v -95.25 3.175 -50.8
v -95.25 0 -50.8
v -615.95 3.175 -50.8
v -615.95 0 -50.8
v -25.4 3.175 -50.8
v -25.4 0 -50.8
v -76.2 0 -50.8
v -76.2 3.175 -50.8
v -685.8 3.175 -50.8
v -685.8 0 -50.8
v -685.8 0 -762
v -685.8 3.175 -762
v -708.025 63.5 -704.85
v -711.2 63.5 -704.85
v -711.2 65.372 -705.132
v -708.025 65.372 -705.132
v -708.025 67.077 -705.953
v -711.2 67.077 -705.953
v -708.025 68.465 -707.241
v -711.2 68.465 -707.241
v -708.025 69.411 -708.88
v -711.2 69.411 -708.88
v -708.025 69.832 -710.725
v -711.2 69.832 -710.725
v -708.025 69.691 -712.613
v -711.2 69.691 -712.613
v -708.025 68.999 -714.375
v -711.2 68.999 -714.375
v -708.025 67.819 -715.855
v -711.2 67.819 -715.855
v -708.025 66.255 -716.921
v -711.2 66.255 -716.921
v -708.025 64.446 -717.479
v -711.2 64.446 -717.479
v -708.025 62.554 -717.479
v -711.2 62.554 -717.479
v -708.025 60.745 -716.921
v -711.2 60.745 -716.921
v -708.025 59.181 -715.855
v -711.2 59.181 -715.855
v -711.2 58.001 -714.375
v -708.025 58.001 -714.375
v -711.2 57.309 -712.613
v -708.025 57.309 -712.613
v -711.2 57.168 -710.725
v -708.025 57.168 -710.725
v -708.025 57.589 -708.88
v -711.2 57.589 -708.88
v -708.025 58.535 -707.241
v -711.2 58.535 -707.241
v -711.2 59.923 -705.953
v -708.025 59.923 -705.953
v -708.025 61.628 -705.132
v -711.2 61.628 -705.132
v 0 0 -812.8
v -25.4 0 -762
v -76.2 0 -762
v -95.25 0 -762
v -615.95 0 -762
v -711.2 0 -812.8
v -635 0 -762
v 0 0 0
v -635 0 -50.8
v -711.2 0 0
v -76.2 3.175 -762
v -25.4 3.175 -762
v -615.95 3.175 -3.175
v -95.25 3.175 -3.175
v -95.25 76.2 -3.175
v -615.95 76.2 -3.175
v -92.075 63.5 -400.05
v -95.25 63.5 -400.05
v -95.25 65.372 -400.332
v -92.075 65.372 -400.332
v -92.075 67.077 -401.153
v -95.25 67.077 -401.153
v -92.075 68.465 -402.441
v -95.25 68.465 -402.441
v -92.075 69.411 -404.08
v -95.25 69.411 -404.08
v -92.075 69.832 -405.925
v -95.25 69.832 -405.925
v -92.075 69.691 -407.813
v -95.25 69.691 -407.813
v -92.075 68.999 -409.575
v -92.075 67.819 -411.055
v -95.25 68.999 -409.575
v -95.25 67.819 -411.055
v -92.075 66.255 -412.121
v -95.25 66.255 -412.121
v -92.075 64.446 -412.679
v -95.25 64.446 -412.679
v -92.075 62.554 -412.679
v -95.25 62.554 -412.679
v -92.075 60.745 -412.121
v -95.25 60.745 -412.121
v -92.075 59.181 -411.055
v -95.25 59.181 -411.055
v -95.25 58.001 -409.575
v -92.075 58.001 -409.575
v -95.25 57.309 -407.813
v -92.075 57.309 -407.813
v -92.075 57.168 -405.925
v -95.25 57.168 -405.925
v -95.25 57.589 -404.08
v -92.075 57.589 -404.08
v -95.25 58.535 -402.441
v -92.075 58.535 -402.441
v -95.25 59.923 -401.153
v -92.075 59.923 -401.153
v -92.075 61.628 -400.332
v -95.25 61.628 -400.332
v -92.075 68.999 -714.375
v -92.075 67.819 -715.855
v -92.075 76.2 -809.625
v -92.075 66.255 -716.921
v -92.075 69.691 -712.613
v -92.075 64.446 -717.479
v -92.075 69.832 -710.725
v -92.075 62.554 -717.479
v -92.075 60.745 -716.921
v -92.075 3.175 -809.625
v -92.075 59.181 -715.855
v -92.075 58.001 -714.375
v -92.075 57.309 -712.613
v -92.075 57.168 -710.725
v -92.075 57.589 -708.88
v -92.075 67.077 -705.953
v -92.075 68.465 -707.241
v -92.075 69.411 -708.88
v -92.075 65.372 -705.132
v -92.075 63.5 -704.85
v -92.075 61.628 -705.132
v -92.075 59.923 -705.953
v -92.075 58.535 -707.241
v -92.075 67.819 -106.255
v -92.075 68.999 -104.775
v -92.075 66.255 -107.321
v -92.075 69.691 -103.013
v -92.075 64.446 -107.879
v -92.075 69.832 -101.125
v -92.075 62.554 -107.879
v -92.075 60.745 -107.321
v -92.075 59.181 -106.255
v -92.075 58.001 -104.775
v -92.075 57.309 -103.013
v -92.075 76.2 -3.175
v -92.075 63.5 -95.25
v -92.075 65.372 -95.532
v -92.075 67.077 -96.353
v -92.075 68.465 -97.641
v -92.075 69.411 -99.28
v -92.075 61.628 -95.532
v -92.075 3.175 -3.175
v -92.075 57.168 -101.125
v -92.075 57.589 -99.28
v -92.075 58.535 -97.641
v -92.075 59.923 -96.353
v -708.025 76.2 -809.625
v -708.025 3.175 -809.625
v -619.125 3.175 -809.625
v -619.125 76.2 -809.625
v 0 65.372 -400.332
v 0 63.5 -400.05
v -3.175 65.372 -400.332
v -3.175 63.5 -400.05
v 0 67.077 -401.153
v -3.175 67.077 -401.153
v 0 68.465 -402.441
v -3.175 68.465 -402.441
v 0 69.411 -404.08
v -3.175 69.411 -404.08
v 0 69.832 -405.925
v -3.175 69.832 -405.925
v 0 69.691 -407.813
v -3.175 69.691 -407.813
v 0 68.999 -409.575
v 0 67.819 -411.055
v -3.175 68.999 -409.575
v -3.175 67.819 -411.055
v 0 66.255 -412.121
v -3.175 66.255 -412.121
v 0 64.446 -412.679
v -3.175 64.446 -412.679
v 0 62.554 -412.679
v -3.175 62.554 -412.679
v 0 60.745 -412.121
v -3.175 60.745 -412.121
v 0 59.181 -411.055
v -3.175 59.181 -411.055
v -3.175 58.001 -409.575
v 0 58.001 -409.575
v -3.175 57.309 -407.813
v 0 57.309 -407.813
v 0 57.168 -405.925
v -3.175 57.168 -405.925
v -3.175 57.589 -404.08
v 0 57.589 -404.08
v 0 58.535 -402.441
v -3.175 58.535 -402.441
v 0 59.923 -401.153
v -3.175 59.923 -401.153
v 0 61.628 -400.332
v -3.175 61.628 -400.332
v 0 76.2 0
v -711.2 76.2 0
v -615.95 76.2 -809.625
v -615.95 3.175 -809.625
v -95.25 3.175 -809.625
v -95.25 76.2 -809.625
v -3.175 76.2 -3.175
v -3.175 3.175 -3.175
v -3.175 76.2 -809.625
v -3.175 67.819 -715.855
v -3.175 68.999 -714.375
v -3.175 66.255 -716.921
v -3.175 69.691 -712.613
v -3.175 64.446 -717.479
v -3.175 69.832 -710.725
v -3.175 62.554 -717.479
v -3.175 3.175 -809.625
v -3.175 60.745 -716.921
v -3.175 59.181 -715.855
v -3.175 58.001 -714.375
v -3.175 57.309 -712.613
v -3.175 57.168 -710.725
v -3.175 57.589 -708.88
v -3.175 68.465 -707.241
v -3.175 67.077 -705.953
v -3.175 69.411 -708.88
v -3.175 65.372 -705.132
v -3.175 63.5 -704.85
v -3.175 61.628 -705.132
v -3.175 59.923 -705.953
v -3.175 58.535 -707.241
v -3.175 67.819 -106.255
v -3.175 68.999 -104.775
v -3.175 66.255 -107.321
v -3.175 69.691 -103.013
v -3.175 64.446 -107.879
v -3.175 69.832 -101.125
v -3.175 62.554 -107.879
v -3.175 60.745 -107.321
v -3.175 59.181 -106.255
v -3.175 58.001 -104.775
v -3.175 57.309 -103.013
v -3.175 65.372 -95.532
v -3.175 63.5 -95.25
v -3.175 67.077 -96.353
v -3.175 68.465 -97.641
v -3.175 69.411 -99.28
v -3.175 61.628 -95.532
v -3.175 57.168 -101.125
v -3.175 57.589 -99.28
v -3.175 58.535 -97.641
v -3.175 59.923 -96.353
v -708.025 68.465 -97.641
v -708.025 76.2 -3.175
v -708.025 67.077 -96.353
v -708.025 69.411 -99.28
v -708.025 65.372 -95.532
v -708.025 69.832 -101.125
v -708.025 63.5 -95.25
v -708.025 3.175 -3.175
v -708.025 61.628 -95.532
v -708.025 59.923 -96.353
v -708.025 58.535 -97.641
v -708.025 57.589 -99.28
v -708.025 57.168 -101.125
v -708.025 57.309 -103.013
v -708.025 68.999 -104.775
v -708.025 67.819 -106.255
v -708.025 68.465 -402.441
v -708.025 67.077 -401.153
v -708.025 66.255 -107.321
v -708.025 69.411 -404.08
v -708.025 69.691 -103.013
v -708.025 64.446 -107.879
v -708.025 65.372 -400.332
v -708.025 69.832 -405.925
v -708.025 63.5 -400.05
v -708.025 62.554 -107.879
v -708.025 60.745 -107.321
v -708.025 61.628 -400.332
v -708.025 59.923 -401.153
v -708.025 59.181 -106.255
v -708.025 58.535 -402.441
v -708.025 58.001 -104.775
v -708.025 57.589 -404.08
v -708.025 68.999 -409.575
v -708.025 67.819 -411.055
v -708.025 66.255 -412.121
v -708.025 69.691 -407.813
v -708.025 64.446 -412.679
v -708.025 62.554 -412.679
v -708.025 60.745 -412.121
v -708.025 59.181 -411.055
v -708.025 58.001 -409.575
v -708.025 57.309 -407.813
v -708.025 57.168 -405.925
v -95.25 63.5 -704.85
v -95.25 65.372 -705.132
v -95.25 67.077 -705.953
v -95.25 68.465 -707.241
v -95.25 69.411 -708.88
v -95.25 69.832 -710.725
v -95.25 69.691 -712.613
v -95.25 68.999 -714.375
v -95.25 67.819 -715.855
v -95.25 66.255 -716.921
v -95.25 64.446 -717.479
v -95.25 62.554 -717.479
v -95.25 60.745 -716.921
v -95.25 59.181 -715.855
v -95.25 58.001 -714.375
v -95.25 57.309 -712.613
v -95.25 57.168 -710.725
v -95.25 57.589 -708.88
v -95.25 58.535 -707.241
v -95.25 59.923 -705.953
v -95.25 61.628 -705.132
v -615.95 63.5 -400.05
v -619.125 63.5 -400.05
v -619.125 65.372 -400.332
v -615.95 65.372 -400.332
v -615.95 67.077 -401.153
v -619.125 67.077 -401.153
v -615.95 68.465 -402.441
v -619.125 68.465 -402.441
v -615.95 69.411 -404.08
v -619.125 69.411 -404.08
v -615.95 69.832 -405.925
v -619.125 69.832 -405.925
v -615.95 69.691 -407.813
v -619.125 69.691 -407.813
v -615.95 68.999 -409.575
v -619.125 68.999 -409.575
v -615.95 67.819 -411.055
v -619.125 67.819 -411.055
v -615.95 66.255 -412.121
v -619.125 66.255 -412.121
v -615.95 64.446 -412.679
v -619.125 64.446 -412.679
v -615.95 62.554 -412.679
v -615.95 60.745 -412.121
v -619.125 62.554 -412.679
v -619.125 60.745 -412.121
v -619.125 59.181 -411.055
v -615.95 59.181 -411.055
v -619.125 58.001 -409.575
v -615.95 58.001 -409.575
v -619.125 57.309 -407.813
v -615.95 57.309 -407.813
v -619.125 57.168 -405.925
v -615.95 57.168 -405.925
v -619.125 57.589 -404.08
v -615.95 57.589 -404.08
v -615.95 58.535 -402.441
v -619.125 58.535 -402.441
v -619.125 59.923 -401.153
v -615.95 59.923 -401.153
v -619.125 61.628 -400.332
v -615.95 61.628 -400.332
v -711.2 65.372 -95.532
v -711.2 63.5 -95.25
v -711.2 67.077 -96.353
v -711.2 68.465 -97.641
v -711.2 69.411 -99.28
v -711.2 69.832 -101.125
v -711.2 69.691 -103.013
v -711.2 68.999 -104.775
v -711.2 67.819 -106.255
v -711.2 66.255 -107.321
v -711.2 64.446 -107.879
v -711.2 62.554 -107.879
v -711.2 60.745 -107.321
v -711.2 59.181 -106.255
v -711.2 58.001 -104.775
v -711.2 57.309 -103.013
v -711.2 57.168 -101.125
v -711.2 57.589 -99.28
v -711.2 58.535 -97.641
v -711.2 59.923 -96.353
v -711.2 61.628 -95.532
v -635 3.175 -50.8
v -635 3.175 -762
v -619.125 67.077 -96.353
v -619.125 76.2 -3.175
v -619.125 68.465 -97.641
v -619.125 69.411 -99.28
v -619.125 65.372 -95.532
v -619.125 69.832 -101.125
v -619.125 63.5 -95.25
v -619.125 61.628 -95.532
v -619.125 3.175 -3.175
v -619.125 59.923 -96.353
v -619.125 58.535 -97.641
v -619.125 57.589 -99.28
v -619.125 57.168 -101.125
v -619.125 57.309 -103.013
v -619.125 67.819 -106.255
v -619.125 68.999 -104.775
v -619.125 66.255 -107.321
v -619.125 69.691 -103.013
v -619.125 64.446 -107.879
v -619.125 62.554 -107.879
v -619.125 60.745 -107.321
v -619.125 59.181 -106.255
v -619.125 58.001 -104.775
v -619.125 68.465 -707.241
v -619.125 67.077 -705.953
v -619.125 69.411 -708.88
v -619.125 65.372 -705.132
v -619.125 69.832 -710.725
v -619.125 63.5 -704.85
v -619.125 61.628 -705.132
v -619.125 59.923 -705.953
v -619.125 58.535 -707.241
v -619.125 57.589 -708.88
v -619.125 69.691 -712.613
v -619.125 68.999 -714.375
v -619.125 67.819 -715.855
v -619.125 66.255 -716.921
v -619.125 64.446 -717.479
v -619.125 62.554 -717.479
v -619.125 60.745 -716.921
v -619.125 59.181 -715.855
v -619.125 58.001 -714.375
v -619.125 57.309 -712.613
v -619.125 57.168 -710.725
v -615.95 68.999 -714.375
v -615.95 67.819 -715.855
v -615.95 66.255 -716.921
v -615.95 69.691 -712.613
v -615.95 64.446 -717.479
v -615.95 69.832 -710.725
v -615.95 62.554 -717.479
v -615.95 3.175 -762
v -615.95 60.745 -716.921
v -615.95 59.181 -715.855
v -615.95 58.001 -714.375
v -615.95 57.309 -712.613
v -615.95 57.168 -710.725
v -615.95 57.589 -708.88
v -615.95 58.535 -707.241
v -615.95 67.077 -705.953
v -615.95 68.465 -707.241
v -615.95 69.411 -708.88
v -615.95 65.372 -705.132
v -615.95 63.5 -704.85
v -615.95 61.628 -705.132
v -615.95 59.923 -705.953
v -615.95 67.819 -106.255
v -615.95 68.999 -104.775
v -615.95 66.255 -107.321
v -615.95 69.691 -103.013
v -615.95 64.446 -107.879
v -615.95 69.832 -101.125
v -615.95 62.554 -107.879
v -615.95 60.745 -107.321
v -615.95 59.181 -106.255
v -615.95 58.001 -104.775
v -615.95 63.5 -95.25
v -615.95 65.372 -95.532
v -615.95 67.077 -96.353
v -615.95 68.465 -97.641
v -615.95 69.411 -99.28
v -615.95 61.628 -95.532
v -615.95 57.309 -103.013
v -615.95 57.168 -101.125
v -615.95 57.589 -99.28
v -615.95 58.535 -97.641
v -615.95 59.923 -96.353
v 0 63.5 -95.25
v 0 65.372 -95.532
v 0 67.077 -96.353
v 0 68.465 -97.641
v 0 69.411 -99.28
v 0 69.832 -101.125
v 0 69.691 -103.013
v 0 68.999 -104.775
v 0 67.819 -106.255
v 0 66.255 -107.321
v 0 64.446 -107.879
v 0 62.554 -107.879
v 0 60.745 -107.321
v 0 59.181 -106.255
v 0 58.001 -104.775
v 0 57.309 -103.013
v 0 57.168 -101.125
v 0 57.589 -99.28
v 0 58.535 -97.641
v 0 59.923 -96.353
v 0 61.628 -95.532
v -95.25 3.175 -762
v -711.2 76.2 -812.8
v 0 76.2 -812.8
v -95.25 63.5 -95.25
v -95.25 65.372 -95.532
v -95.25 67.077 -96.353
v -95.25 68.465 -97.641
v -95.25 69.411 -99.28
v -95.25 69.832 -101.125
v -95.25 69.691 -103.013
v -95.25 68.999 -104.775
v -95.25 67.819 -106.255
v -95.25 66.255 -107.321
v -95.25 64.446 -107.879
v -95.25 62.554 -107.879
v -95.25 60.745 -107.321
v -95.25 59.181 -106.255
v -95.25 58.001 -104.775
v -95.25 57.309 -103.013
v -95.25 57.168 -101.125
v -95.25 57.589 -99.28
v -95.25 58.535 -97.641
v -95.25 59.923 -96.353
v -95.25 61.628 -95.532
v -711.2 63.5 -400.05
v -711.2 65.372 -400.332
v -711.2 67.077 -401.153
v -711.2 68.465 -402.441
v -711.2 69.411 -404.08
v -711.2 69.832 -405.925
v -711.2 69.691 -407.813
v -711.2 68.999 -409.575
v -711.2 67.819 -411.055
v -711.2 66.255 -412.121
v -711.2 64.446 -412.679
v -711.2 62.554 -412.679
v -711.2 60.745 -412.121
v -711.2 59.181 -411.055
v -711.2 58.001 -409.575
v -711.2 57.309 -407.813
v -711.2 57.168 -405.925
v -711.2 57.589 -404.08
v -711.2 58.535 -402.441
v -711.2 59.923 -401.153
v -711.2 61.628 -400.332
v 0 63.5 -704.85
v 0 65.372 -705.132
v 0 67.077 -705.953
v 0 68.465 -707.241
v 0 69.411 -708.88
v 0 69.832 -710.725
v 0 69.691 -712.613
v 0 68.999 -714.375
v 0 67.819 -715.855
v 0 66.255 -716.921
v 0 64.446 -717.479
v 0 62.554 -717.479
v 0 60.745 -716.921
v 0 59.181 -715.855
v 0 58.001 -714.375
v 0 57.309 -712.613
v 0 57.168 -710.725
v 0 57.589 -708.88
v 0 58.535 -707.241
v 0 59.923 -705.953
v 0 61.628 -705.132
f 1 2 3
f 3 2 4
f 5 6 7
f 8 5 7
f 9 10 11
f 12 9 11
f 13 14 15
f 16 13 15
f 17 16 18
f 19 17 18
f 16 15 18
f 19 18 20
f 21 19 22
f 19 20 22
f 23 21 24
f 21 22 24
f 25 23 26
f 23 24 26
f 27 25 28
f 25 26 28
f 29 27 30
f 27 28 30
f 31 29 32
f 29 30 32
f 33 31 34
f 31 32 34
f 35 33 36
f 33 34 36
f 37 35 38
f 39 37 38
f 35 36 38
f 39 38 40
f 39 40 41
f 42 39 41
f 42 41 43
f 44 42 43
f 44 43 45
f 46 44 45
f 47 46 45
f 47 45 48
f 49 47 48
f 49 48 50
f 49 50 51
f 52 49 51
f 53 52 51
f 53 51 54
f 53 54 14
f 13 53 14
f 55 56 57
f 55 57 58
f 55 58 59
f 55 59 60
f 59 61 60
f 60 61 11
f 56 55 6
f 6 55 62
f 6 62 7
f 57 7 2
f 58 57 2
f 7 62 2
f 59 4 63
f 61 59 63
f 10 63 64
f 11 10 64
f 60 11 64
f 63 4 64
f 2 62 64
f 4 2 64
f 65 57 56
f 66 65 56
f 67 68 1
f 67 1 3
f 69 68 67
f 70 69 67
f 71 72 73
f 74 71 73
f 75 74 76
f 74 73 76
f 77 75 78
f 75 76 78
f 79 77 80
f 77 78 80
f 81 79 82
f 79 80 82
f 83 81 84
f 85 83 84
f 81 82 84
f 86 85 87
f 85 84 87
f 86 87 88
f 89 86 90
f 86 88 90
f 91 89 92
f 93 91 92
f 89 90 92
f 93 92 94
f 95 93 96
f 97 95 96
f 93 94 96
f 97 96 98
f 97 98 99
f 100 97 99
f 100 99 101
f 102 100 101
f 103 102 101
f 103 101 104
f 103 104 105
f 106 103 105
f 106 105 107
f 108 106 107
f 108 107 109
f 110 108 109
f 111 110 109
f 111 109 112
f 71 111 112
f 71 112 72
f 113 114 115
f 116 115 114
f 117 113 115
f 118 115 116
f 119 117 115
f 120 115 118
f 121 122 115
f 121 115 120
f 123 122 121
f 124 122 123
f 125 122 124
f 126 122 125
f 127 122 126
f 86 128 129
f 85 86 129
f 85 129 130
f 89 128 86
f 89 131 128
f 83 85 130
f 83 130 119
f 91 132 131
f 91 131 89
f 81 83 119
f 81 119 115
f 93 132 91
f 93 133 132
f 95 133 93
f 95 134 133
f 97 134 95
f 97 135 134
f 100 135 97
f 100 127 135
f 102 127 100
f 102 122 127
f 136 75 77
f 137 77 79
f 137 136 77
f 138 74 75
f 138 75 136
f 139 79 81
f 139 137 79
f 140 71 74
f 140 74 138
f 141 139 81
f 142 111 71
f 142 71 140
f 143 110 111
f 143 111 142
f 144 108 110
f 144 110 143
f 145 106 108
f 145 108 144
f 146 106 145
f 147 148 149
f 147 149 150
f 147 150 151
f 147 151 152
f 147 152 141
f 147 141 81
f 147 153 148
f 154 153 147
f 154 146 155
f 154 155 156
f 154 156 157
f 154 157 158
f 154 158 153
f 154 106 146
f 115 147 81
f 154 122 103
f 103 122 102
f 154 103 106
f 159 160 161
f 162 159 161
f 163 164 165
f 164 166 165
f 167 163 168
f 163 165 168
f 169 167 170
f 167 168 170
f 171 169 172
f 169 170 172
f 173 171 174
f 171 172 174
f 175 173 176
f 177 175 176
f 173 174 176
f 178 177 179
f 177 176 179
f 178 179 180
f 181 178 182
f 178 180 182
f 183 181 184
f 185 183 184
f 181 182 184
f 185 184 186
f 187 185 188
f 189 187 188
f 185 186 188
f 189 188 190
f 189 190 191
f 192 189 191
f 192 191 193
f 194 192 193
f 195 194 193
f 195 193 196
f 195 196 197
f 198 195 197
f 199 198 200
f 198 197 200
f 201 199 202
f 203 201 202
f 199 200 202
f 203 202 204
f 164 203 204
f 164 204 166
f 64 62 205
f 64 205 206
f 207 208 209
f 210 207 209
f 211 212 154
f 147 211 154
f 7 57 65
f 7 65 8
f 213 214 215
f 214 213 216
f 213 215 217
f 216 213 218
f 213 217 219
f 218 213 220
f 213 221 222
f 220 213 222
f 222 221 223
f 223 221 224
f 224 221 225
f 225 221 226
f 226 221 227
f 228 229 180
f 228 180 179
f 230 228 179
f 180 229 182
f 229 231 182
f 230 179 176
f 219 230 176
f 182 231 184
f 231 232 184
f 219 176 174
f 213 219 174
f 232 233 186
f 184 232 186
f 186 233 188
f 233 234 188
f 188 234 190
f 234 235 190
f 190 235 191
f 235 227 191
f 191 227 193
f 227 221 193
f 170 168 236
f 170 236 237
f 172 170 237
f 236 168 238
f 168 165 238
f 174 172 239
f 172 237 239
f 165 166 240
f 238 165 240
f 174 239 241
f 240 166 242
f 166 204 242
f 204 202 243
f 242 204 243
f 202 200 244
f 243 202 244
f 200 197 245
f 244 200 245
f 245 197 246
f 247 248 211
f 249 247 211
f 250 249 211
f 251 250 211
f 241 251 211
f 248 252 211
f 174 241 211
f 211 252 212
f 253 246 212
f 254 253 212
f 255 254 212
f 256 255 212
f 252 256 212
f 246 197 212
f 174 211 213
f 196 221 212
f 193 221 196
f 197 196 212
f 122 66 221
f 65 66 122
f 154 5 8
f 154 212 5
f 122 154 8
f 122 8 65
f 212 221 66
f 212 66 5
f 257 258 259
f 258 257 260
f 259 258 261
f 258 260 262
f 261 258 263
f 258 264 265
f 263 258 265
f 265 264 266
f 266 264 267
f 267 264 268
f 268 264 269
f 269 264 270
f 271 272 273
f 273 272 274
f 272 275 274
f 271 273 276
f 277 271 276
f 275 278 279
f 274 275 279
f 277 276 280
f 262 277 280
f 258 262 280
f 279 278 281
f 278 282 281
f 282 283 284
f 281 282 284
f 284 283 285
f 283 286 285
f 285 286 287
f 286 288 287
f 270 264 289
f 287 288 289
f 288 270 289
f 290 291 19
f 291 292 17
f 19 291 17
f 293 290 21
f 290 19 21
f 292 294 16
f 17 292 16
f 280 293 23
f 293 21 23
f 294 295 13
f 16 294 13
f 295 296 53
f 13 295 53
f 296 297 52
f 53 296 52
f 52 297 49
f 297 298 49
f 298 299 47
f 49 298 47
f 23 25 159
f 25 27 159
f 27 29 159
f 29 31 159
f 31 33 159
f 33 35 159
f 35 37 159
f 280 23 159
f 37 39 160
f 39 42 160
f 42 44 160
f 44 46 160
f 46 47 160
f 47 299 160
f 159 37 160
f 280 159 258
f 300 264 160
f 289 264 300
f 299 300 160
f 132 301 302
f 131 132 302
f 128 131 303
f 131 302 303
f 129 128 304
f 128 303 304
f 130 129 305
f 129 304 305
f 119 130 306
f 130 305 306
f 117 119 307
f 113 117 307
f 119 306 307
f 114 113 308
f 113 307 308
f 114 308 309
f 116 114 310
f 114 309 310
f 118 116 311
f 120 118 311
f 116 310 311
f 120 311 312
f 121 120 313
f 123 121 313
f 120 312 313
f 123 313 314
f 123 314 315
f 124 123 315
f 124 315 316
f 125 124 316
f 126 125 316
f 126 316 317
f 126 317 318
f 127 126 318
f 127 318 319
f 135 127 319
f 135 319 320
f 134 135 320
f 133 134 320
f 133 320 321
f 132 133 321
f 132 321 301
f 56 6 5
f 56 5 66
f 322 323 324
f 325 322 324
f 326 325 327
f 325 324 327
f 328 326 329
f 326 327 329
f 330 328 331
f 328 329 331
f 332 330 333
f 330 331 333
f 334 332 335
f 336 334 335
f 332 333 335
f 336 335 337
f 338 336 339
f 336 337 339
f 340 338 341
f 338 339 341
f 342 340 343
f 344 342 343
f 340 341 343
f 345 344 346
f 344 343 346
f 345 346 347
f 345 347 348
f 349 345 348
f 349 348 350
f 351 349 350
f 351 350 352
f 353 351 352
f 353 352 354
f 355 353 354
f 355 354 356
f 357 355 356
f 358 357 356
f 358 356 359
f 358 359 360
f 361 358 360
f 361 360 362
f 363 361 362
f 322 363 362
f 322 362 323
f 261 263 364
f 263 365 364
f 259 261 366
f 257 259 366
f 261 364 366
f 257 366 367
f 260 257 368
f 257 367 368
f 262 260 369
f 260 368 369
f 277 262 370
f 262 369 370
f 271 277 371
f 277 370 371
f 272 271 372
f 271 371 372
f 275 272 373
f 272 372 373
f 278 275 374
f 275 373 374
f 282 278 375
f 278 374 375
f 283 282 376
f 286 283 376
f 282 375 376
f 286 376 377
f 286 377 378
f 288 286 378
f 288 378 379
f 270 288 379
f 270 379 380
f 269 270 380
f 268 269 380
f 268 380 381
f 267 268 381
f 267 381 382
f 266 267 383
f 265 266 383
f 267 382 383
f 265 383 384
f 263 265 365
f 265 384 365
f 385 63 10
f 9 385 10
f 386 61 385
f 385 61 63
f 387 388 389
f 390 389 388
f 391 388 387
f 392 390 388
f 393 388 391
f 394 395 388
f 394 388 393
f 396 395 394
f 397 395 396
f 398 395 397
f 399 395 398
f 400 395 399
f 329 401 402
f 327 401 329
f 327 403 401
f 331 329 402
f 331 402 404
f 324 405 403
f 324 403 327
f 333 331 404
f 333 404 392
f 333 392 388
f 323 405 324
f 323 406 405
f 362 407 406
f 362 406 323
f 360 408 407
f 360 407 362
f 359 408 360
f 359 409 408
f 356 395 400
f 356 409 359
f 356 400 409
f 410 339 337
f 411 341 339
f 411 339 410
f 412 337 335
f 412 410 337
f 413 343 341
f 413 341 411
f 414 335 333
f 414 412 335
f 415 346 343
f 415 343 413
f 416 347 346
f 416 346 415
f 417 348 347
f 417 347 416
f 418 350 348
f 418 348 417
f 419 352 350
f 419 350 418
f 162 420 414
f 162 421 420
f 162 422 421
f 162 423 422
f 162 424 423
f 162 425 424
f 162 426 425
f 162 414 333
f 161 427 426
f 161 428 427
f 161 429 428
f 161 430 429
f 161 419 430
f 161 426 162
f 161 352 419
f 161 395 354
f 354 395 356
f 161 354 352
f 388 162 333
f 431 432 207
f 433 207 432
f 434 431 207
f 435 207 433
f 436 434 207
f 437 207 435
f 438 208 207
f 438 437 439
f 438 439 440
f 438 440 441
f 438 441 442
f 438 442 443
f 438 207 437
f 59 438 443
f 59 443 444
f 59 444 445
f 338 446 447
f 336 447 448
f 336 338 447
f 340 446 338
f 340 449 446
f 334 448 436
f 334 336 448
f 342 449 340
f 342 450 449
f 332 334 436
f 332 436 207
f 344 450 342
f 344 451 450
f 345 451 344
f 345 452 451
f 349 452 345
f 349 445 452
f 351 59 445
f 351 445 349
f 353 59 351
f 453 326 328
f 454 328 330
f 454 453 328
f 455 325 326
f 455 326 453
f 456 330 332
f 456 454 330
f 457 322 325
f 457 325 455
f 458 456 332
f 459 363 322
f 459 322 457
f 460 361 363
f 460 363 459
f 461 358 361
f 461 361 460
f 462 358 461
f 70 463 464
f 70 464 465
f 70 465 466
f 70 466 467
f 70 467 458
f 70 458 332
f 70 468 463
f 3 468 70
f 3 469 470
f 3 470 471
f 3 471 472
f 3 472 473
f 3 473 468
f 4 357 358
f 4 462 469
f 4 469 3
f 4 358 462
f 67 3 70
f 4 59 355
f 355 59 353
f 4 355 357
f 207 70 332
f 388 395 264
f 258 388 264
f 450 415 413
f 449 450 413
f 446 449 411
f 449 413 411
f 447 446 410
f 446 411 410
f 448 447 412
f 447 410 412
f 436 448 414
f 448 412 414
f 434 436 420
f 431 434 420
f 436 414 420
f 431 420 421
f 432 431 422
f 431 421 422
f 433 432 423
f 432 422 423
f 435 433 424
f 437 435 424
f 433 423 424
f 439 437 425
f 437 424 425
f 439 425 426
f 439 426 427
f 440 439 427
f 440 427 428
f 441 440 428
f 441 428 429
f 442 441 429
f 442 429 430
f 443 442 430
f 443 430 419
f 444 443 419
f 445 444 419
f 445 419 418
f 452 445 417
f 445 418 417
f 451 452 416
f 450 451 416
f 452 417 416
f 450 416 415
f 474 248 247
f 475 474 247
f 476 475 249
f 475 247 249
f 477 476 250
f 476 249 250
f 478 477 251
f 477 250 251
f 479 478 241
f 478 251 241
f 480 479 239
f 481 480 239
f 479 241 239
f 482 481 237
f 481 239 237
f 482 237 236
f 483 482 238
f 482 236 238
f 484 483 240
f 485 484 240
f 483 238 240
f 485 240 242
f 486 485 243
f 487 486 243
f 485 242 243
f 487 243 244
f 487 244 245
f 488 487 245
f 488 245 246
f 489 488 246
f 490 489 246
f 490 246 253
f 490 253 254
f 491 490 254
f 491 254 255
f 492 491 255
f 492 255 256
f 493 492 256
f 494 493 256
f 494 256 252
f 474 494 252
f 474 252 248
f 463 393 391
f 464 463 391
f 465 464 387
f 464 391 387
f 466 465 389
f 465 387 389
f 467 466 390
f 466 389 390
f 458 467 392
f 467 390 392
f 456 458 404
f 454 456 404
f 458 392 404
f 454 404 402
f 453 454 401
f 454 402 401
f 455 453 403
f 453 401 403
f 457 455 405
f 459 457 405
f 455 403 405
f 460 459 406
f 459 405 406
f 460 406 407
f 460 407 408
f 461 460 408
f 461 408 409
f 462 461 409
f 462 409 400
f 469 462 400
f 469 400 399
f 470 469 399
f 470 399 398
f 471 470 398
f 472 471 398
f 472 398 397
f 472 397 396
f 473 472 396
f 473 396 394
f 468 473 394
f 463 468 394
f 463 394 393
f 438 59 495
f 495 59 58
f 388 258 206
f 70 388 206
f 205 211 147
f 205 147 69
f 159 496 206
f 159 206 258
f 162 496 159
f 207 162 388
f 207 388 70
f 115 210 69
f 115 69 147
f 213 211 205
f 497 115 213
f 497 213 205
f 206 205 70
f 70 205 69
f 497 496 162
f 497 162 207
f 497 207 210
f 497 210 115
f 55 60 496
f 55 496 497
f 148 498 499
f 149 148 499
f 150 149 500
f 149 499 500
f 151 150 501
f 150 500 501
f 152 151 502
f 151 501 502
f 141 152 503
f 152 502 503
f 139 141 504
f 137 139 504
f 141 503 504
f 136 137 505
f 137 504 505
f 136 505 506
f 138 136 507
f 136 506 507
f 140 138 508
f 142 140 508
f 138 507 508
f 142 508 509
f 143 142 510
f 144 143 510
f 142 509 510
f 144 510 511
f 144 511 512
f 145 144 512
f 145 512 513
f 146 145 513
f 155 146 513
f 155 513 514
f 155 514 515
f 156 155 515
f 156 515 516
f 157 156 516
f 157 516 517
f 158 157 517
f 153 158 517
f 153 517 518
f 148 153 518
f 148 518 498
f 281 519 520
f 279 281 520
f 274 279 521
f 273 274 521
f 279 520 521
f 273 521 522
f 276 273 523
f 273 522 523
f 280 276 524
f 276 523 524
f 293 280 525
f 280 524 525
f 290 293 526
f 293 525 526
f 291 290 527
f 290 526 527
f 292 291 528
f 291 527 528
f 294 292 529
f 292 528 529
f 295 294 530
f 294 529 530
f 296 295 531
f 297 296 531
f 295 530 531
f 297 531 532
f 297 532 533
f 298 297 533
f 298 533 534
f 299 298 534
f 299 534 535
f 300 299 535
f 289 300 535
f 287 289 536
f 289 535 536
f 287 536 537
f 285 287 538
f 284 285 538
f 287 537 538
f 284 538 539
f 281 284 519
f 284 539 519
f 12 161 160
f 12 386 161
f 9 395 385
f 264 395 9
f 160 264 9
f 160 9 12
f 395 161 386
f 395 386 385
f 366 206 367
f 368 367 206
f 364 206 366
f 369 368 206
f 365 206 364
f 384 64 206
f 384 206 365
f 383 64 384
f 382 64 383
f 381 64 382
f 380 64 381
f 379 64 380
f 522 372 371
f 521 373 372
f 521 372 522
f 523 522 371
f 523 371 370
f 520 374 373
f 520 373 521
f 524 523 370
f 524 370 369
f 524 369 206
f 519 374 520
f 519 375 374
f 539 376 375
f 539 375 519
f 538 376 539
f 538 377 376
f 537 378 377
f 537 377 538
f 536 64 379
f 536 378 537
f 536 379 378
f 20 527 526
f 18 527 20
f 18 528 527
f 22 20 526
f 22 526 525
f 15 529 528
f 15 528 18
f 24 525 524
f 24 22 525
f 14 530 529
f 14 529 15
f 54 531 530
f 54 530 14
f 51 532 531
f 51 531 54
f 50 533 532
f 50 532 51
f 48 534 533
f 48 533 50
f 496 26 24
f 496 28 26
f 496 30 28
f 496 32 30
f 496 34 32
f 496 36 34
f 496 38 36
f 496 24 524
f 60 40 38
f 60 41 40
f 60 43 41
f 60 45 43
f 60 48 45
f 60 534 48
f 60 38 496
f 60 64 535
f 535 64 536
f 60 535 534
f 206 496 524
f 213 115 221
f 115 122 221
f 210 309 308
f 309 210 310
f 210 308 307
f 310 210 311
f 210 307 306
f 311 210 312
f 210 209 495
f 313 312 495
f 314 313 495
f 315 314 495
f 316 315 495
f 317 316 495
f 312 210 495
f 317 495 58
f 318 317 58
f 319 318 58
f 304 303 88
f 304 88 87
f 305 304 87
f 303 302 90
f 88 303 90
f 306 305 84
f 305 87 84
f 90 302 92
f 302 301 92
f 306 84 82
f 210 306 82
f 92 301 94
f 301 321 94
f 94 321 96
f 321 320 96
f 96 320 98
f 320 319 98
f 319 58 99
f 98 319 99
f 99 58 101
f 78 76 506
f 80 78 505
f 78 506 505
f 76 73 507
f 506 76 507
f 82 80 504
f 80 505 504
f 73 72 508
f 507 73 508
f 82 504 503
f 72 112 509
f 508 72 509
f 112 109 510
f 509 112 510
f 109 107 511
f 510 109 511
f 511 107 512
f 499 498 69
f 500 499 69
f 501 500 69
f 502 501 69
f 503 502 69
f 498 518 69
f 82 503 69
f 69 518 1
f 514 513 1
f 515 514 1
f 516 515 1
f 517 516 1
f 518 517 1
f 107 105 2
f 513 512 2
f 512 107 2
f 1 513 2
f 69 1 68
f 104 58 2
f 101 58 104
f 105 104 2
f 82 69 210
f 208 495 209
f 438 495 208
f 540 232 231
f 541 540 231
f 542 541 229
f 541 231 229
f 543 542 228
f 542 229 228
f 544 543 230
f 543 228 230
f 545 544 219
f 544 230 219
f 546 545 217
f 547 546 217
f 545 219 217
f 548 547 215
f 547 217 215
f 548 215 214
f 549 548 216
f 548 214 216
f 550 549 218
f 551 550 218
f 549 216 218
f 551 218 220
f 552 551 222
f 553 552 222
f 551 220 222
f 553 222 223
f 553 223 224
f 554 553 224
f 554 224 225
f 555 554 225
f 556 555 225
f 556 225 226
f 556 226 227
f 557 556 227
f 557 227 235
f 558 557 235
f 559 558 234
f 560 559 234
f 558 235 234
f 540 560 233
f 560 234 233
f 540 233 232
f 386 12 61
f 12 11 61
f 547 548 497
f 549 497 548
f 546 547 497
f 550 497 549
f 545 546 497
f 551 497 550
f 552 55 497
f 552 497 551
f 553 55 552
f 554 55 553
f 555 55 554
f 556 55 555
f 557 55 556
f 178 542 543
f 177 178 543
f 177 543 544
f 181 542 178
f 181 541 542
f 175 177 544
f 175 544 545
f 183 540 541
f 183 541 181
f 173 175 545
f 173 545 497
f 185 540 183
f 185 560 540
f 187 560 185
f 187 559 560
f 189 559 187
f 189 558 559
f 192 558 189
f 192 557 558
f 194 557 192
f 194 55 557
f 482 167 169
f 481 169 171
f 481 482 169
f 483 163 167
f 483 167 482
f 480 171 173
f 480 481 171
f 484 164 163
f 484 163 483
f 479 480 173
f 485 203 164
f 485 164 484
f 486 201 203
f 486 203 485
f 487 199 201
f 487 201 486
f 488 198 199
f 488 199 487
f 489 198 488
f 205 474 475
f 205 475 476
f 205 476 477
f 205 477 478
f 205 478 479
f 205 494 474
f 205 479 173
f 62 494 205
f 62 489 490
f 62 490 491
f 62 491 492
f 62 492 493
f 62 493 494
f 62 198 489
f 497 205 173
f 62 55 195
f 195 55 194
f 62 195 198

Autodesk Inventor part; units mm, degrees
ref_plane "YZ Plane" through (0, 0, 0) normal (1, 0, 0) x (0, 1, 0)
ref_plane "XZ Plane" through (0, 0, 0) normal (0, 1, 0) x (-1, 0, 0)
ref_plane "XY Plane" through (0, 0, 0) normal (0, 0, 1) x (1, 0, 0)
sketch "Sketch1" plane through (0, 0, 0) normal (0, 1, 0) x (-1, 0, 0)
  line L0 (0, 0) -> (711.2, 0)
  line L1 (711.2, 0) -> (711.2, -812.8)
  line L2 (711.2, -812.8) -> (0, -812.8)
  line L3 (0, -812.8) -> (0, 0)
  line L4 (0, 0) -> (711.2, 0)
  line L5 (711.2, 0) -> (711.2, -76.2)
  line L6 (0, -76.2) -> (0, 0)
  line L7 (0, -812.8) -> (711.2, -812.8)
  line L8 (711.2, -812.8) -> (711.2, -736.6)
  line L9 (0, -736.6) -> (0, -812.8)
  line L10 (0, 0) -> (25.4, 0)
  line L11 (25.4, -76.2) -> (25.4, -736.6)
  line L12 (25.4, -812.8) -> (0, -812.8)
  line L13 (0, -812.8) -> (0, 0)
  line L14 (711.2, 0) -> (685.8, 0)
  line L15 (685.8, -76.2) -> (685.8, -736.6)
  line L16 (685.8, -812.8) -> (711.2, -812.8)
  line L17 (711.2, -812.8) -> (711.2, 0)
  line L18 (685.8, -736.6) -> (635, -736.6)
  line L19 (615.95, -736.6) -> (615.95, -76.2)
  line L20 (635, -76.2) -> (635, -736.6)
  line L21 (25.4, -736.6) -> (76.2, -736.6)
  line L22 (95.25, -736.6) -> (95.25, -76.2)
  line L23 (76.2, -76.2) -> (76.2, -736.6)
  line L24 (685.8, -76.2) -> (635, -76.2)
  line L25 (685.8, -736.6) -> (635, -736.6)
  line L26 (615.95, -736.6) -> (95.25, -736.6)
  line L27 (76.2, -736.6) -> (25.4, -736.6)
  line L28 (615.95, -76.2) -> (95.25, -76.2)
  line L29 (76.2, -76.2) -> (25.4, -76.2)
  dimension "d0" = 711.2
  dimension "d1" = 812.8
  dimension "d2" = 76.2
  dimension "d3" = 76.2
  dimension "d4" = 25.4
  dimension "d5" = 25.4
  dimension "d6" = 812.8
  dimension "d10" = 660.4
extrude "Extrusion1" add sketch "Sketch1" along normal blind 3.175
sketch "Sketch2" plane through (0, 3.175, 0) normal (0, 1, 0) x (1, 0, 0)
  line L0 (-711.2, 812.8) -> (0, 812.8)
  line L1 (0, 812.8) -> (0, 0)
  line L2 (0, 0) -> (-711.2, 0)
  line L3 (-711.2, 0) -> (-711.2, 812.8)
  line L4 (-708.025, 809.625) -> (-3.175, 809.625)
  line L5 (-3.175, 809.625) -> (-3.175, 3.175)
  line L6 (-3.175, 3.175) -> (-708.025, 3.175)
  line L7 (-708.025, 3.175) -> (-708.025, 809.625)
extrude "Extrusion2" add sketch "Sketch2" along normal blind 73.025
sketch "Sketch3" plane through (0, 0, 0) normal (0, -1, 0) x (1, 0, 0)
  line L0 (-25.4, -76.2) -> (-25.4, -50.8)
  line L1 (-25.4, -50.8) -> (-685.8, -50.8)
  line L2 (-685.8, -50.8) -> (-685.8, -762)
  line L3 (-685.8, -762) -> (-25.4, -762)
  line L4 (-25.4, -762) -> (-25.4, -50.8)
  line L5 (-25.4, -76.2) -> (-76.2, -76.2)
  line L6 (-76.2, -76.2) -> (-76.2, -50.8)
  line L7 (-95.25, -76.2) -> (-95.25, -50.8)
  line L8 (-95.25, -76.2) -> (-615.95, -76.2)
  line L9 (-615.95, -76.2) -> (-615.95, -50.8)
  line L10 (-635, -76.2) -> (-635, -50.8)
  line L11 (-635, -76.2) -> (-685.8, -76.2)
  line L12 (-95.25, -736.6) -> (-95.25, -762)
  line L13 (-95.25, -736.6) -> (-615.95, -736.6)
  line L14 (-615.95, -736.6) -> (-615.95, -762)
  line L15 (-635, -736.6) -> (-635, -762)
  line L16 (-635, -736.6) -> (-685.8, -736.6)
  line L17 (-635, -50.8) -> (-685.8, -50.8)
  line L18 (-685.8, -50.8) -> (-685.8, -76.2)
  line L19 (-685.8, -736.6) -> (-685.8, -762)
  line L20 (-685.8, -762) -> (-635, -762)
  line L21 (-615.95, -762) -> (-95.25, -762)
  line L22 (-95.25, -762) -> (-95.25, -736.6)
  line L23 (-25.4, -736.6) -> (-25.4, -76.2) projected
  line L24 (-25.4, -762) -> (-76.2, -762)
  line L25 (-76.2, -762) -> (-76.2, -736.6)
  line L26 (-76.2, -736.6) -> (-25.4, -736.6)
  line L27 (-25.4, -736.6) -> (-25.4, -762)
  point P0 (0, 0)
  dimension "d22" = 25.4
  dimension "d23" = 660.4
  dimension "d24" = 711.2
  dimension "d25" = 25.4
  dimension "d26" = 25.4
extrude "Extrusion3" cut sketch "Sketch3" against normal blind 73.025 contours L5 L6 L1 L0 | L4 L3 L25 L26 | L7 L8 L9 L1 | L3 L14 L13 L12 | L10 L11 L2 L1 | L3 L2 L16 L15
sketch "Sketch4" plane through (-711.2, 0, -812.8) normal (-1, 0, 0) x (0, 0, 1)
  line L0 (812.8, 76.2) -> (406.4, 76.2)
  line L1 (812.8, 76.2) -> (0, 76.2) projected
  line L2 (762, 0) -> (50.8, 0) projected
  circle A0 centre (406.4, 63.5) radius 6.35
  circle A1 centre (711.2, 63.5) radius 6.35
  circle A2 centre (101.6, 63.5) radius 6.35
  point P0 (812.8, 0)
  dimension "d29" = 406.4
  dimension "d31" = 12.7
  dimension "d35" = 12.7
  dimension "d36" = 12.7
sketch "Sketch5" plane through (0, 3.175, 0) normal (0, 1, 0) x (1, 0, 0)
  line L0 (-708.025, 3.175) -> (-3.175, 3.175) projected
  line L1 (-3.175, 809.625) -> (-708.025, 809.625) projected
  line L2 (-615.95, 3.175) -> (-619.125, 3.175)
  line L3 (-619.125, 3.175) -> (-619.125, 809.625)
  line L4 (-619.125, 809.625) -> (-615.95, 809.625)
  line L5 (-615.95, 809.625) -> (-615.95, 3.175)
  line L6 (-95.25, 809.625) -> (-92.075, 809.625)
  line L7 (-92.075, 809.625) -> (-92.075, 3.175)
  line L8 (-92.075, 3.175) -> (-95.25, 3.175)
  line L9 (-95.25, 3.175) -> (-95.25, 809.625)
  point P0 (0, 0)
  dimension "d37" = 3.175
  dimension "d38" = 3.175
extrude "Extrusion4" add sketch "Sketch5" along normal blind 73.025 contours L3 L1 L5 L0 | L9 L1 L7 L0
extrude "Extrusion5" cut sketch "Sketch4" against normal blind 1016
properties part number "Base"
